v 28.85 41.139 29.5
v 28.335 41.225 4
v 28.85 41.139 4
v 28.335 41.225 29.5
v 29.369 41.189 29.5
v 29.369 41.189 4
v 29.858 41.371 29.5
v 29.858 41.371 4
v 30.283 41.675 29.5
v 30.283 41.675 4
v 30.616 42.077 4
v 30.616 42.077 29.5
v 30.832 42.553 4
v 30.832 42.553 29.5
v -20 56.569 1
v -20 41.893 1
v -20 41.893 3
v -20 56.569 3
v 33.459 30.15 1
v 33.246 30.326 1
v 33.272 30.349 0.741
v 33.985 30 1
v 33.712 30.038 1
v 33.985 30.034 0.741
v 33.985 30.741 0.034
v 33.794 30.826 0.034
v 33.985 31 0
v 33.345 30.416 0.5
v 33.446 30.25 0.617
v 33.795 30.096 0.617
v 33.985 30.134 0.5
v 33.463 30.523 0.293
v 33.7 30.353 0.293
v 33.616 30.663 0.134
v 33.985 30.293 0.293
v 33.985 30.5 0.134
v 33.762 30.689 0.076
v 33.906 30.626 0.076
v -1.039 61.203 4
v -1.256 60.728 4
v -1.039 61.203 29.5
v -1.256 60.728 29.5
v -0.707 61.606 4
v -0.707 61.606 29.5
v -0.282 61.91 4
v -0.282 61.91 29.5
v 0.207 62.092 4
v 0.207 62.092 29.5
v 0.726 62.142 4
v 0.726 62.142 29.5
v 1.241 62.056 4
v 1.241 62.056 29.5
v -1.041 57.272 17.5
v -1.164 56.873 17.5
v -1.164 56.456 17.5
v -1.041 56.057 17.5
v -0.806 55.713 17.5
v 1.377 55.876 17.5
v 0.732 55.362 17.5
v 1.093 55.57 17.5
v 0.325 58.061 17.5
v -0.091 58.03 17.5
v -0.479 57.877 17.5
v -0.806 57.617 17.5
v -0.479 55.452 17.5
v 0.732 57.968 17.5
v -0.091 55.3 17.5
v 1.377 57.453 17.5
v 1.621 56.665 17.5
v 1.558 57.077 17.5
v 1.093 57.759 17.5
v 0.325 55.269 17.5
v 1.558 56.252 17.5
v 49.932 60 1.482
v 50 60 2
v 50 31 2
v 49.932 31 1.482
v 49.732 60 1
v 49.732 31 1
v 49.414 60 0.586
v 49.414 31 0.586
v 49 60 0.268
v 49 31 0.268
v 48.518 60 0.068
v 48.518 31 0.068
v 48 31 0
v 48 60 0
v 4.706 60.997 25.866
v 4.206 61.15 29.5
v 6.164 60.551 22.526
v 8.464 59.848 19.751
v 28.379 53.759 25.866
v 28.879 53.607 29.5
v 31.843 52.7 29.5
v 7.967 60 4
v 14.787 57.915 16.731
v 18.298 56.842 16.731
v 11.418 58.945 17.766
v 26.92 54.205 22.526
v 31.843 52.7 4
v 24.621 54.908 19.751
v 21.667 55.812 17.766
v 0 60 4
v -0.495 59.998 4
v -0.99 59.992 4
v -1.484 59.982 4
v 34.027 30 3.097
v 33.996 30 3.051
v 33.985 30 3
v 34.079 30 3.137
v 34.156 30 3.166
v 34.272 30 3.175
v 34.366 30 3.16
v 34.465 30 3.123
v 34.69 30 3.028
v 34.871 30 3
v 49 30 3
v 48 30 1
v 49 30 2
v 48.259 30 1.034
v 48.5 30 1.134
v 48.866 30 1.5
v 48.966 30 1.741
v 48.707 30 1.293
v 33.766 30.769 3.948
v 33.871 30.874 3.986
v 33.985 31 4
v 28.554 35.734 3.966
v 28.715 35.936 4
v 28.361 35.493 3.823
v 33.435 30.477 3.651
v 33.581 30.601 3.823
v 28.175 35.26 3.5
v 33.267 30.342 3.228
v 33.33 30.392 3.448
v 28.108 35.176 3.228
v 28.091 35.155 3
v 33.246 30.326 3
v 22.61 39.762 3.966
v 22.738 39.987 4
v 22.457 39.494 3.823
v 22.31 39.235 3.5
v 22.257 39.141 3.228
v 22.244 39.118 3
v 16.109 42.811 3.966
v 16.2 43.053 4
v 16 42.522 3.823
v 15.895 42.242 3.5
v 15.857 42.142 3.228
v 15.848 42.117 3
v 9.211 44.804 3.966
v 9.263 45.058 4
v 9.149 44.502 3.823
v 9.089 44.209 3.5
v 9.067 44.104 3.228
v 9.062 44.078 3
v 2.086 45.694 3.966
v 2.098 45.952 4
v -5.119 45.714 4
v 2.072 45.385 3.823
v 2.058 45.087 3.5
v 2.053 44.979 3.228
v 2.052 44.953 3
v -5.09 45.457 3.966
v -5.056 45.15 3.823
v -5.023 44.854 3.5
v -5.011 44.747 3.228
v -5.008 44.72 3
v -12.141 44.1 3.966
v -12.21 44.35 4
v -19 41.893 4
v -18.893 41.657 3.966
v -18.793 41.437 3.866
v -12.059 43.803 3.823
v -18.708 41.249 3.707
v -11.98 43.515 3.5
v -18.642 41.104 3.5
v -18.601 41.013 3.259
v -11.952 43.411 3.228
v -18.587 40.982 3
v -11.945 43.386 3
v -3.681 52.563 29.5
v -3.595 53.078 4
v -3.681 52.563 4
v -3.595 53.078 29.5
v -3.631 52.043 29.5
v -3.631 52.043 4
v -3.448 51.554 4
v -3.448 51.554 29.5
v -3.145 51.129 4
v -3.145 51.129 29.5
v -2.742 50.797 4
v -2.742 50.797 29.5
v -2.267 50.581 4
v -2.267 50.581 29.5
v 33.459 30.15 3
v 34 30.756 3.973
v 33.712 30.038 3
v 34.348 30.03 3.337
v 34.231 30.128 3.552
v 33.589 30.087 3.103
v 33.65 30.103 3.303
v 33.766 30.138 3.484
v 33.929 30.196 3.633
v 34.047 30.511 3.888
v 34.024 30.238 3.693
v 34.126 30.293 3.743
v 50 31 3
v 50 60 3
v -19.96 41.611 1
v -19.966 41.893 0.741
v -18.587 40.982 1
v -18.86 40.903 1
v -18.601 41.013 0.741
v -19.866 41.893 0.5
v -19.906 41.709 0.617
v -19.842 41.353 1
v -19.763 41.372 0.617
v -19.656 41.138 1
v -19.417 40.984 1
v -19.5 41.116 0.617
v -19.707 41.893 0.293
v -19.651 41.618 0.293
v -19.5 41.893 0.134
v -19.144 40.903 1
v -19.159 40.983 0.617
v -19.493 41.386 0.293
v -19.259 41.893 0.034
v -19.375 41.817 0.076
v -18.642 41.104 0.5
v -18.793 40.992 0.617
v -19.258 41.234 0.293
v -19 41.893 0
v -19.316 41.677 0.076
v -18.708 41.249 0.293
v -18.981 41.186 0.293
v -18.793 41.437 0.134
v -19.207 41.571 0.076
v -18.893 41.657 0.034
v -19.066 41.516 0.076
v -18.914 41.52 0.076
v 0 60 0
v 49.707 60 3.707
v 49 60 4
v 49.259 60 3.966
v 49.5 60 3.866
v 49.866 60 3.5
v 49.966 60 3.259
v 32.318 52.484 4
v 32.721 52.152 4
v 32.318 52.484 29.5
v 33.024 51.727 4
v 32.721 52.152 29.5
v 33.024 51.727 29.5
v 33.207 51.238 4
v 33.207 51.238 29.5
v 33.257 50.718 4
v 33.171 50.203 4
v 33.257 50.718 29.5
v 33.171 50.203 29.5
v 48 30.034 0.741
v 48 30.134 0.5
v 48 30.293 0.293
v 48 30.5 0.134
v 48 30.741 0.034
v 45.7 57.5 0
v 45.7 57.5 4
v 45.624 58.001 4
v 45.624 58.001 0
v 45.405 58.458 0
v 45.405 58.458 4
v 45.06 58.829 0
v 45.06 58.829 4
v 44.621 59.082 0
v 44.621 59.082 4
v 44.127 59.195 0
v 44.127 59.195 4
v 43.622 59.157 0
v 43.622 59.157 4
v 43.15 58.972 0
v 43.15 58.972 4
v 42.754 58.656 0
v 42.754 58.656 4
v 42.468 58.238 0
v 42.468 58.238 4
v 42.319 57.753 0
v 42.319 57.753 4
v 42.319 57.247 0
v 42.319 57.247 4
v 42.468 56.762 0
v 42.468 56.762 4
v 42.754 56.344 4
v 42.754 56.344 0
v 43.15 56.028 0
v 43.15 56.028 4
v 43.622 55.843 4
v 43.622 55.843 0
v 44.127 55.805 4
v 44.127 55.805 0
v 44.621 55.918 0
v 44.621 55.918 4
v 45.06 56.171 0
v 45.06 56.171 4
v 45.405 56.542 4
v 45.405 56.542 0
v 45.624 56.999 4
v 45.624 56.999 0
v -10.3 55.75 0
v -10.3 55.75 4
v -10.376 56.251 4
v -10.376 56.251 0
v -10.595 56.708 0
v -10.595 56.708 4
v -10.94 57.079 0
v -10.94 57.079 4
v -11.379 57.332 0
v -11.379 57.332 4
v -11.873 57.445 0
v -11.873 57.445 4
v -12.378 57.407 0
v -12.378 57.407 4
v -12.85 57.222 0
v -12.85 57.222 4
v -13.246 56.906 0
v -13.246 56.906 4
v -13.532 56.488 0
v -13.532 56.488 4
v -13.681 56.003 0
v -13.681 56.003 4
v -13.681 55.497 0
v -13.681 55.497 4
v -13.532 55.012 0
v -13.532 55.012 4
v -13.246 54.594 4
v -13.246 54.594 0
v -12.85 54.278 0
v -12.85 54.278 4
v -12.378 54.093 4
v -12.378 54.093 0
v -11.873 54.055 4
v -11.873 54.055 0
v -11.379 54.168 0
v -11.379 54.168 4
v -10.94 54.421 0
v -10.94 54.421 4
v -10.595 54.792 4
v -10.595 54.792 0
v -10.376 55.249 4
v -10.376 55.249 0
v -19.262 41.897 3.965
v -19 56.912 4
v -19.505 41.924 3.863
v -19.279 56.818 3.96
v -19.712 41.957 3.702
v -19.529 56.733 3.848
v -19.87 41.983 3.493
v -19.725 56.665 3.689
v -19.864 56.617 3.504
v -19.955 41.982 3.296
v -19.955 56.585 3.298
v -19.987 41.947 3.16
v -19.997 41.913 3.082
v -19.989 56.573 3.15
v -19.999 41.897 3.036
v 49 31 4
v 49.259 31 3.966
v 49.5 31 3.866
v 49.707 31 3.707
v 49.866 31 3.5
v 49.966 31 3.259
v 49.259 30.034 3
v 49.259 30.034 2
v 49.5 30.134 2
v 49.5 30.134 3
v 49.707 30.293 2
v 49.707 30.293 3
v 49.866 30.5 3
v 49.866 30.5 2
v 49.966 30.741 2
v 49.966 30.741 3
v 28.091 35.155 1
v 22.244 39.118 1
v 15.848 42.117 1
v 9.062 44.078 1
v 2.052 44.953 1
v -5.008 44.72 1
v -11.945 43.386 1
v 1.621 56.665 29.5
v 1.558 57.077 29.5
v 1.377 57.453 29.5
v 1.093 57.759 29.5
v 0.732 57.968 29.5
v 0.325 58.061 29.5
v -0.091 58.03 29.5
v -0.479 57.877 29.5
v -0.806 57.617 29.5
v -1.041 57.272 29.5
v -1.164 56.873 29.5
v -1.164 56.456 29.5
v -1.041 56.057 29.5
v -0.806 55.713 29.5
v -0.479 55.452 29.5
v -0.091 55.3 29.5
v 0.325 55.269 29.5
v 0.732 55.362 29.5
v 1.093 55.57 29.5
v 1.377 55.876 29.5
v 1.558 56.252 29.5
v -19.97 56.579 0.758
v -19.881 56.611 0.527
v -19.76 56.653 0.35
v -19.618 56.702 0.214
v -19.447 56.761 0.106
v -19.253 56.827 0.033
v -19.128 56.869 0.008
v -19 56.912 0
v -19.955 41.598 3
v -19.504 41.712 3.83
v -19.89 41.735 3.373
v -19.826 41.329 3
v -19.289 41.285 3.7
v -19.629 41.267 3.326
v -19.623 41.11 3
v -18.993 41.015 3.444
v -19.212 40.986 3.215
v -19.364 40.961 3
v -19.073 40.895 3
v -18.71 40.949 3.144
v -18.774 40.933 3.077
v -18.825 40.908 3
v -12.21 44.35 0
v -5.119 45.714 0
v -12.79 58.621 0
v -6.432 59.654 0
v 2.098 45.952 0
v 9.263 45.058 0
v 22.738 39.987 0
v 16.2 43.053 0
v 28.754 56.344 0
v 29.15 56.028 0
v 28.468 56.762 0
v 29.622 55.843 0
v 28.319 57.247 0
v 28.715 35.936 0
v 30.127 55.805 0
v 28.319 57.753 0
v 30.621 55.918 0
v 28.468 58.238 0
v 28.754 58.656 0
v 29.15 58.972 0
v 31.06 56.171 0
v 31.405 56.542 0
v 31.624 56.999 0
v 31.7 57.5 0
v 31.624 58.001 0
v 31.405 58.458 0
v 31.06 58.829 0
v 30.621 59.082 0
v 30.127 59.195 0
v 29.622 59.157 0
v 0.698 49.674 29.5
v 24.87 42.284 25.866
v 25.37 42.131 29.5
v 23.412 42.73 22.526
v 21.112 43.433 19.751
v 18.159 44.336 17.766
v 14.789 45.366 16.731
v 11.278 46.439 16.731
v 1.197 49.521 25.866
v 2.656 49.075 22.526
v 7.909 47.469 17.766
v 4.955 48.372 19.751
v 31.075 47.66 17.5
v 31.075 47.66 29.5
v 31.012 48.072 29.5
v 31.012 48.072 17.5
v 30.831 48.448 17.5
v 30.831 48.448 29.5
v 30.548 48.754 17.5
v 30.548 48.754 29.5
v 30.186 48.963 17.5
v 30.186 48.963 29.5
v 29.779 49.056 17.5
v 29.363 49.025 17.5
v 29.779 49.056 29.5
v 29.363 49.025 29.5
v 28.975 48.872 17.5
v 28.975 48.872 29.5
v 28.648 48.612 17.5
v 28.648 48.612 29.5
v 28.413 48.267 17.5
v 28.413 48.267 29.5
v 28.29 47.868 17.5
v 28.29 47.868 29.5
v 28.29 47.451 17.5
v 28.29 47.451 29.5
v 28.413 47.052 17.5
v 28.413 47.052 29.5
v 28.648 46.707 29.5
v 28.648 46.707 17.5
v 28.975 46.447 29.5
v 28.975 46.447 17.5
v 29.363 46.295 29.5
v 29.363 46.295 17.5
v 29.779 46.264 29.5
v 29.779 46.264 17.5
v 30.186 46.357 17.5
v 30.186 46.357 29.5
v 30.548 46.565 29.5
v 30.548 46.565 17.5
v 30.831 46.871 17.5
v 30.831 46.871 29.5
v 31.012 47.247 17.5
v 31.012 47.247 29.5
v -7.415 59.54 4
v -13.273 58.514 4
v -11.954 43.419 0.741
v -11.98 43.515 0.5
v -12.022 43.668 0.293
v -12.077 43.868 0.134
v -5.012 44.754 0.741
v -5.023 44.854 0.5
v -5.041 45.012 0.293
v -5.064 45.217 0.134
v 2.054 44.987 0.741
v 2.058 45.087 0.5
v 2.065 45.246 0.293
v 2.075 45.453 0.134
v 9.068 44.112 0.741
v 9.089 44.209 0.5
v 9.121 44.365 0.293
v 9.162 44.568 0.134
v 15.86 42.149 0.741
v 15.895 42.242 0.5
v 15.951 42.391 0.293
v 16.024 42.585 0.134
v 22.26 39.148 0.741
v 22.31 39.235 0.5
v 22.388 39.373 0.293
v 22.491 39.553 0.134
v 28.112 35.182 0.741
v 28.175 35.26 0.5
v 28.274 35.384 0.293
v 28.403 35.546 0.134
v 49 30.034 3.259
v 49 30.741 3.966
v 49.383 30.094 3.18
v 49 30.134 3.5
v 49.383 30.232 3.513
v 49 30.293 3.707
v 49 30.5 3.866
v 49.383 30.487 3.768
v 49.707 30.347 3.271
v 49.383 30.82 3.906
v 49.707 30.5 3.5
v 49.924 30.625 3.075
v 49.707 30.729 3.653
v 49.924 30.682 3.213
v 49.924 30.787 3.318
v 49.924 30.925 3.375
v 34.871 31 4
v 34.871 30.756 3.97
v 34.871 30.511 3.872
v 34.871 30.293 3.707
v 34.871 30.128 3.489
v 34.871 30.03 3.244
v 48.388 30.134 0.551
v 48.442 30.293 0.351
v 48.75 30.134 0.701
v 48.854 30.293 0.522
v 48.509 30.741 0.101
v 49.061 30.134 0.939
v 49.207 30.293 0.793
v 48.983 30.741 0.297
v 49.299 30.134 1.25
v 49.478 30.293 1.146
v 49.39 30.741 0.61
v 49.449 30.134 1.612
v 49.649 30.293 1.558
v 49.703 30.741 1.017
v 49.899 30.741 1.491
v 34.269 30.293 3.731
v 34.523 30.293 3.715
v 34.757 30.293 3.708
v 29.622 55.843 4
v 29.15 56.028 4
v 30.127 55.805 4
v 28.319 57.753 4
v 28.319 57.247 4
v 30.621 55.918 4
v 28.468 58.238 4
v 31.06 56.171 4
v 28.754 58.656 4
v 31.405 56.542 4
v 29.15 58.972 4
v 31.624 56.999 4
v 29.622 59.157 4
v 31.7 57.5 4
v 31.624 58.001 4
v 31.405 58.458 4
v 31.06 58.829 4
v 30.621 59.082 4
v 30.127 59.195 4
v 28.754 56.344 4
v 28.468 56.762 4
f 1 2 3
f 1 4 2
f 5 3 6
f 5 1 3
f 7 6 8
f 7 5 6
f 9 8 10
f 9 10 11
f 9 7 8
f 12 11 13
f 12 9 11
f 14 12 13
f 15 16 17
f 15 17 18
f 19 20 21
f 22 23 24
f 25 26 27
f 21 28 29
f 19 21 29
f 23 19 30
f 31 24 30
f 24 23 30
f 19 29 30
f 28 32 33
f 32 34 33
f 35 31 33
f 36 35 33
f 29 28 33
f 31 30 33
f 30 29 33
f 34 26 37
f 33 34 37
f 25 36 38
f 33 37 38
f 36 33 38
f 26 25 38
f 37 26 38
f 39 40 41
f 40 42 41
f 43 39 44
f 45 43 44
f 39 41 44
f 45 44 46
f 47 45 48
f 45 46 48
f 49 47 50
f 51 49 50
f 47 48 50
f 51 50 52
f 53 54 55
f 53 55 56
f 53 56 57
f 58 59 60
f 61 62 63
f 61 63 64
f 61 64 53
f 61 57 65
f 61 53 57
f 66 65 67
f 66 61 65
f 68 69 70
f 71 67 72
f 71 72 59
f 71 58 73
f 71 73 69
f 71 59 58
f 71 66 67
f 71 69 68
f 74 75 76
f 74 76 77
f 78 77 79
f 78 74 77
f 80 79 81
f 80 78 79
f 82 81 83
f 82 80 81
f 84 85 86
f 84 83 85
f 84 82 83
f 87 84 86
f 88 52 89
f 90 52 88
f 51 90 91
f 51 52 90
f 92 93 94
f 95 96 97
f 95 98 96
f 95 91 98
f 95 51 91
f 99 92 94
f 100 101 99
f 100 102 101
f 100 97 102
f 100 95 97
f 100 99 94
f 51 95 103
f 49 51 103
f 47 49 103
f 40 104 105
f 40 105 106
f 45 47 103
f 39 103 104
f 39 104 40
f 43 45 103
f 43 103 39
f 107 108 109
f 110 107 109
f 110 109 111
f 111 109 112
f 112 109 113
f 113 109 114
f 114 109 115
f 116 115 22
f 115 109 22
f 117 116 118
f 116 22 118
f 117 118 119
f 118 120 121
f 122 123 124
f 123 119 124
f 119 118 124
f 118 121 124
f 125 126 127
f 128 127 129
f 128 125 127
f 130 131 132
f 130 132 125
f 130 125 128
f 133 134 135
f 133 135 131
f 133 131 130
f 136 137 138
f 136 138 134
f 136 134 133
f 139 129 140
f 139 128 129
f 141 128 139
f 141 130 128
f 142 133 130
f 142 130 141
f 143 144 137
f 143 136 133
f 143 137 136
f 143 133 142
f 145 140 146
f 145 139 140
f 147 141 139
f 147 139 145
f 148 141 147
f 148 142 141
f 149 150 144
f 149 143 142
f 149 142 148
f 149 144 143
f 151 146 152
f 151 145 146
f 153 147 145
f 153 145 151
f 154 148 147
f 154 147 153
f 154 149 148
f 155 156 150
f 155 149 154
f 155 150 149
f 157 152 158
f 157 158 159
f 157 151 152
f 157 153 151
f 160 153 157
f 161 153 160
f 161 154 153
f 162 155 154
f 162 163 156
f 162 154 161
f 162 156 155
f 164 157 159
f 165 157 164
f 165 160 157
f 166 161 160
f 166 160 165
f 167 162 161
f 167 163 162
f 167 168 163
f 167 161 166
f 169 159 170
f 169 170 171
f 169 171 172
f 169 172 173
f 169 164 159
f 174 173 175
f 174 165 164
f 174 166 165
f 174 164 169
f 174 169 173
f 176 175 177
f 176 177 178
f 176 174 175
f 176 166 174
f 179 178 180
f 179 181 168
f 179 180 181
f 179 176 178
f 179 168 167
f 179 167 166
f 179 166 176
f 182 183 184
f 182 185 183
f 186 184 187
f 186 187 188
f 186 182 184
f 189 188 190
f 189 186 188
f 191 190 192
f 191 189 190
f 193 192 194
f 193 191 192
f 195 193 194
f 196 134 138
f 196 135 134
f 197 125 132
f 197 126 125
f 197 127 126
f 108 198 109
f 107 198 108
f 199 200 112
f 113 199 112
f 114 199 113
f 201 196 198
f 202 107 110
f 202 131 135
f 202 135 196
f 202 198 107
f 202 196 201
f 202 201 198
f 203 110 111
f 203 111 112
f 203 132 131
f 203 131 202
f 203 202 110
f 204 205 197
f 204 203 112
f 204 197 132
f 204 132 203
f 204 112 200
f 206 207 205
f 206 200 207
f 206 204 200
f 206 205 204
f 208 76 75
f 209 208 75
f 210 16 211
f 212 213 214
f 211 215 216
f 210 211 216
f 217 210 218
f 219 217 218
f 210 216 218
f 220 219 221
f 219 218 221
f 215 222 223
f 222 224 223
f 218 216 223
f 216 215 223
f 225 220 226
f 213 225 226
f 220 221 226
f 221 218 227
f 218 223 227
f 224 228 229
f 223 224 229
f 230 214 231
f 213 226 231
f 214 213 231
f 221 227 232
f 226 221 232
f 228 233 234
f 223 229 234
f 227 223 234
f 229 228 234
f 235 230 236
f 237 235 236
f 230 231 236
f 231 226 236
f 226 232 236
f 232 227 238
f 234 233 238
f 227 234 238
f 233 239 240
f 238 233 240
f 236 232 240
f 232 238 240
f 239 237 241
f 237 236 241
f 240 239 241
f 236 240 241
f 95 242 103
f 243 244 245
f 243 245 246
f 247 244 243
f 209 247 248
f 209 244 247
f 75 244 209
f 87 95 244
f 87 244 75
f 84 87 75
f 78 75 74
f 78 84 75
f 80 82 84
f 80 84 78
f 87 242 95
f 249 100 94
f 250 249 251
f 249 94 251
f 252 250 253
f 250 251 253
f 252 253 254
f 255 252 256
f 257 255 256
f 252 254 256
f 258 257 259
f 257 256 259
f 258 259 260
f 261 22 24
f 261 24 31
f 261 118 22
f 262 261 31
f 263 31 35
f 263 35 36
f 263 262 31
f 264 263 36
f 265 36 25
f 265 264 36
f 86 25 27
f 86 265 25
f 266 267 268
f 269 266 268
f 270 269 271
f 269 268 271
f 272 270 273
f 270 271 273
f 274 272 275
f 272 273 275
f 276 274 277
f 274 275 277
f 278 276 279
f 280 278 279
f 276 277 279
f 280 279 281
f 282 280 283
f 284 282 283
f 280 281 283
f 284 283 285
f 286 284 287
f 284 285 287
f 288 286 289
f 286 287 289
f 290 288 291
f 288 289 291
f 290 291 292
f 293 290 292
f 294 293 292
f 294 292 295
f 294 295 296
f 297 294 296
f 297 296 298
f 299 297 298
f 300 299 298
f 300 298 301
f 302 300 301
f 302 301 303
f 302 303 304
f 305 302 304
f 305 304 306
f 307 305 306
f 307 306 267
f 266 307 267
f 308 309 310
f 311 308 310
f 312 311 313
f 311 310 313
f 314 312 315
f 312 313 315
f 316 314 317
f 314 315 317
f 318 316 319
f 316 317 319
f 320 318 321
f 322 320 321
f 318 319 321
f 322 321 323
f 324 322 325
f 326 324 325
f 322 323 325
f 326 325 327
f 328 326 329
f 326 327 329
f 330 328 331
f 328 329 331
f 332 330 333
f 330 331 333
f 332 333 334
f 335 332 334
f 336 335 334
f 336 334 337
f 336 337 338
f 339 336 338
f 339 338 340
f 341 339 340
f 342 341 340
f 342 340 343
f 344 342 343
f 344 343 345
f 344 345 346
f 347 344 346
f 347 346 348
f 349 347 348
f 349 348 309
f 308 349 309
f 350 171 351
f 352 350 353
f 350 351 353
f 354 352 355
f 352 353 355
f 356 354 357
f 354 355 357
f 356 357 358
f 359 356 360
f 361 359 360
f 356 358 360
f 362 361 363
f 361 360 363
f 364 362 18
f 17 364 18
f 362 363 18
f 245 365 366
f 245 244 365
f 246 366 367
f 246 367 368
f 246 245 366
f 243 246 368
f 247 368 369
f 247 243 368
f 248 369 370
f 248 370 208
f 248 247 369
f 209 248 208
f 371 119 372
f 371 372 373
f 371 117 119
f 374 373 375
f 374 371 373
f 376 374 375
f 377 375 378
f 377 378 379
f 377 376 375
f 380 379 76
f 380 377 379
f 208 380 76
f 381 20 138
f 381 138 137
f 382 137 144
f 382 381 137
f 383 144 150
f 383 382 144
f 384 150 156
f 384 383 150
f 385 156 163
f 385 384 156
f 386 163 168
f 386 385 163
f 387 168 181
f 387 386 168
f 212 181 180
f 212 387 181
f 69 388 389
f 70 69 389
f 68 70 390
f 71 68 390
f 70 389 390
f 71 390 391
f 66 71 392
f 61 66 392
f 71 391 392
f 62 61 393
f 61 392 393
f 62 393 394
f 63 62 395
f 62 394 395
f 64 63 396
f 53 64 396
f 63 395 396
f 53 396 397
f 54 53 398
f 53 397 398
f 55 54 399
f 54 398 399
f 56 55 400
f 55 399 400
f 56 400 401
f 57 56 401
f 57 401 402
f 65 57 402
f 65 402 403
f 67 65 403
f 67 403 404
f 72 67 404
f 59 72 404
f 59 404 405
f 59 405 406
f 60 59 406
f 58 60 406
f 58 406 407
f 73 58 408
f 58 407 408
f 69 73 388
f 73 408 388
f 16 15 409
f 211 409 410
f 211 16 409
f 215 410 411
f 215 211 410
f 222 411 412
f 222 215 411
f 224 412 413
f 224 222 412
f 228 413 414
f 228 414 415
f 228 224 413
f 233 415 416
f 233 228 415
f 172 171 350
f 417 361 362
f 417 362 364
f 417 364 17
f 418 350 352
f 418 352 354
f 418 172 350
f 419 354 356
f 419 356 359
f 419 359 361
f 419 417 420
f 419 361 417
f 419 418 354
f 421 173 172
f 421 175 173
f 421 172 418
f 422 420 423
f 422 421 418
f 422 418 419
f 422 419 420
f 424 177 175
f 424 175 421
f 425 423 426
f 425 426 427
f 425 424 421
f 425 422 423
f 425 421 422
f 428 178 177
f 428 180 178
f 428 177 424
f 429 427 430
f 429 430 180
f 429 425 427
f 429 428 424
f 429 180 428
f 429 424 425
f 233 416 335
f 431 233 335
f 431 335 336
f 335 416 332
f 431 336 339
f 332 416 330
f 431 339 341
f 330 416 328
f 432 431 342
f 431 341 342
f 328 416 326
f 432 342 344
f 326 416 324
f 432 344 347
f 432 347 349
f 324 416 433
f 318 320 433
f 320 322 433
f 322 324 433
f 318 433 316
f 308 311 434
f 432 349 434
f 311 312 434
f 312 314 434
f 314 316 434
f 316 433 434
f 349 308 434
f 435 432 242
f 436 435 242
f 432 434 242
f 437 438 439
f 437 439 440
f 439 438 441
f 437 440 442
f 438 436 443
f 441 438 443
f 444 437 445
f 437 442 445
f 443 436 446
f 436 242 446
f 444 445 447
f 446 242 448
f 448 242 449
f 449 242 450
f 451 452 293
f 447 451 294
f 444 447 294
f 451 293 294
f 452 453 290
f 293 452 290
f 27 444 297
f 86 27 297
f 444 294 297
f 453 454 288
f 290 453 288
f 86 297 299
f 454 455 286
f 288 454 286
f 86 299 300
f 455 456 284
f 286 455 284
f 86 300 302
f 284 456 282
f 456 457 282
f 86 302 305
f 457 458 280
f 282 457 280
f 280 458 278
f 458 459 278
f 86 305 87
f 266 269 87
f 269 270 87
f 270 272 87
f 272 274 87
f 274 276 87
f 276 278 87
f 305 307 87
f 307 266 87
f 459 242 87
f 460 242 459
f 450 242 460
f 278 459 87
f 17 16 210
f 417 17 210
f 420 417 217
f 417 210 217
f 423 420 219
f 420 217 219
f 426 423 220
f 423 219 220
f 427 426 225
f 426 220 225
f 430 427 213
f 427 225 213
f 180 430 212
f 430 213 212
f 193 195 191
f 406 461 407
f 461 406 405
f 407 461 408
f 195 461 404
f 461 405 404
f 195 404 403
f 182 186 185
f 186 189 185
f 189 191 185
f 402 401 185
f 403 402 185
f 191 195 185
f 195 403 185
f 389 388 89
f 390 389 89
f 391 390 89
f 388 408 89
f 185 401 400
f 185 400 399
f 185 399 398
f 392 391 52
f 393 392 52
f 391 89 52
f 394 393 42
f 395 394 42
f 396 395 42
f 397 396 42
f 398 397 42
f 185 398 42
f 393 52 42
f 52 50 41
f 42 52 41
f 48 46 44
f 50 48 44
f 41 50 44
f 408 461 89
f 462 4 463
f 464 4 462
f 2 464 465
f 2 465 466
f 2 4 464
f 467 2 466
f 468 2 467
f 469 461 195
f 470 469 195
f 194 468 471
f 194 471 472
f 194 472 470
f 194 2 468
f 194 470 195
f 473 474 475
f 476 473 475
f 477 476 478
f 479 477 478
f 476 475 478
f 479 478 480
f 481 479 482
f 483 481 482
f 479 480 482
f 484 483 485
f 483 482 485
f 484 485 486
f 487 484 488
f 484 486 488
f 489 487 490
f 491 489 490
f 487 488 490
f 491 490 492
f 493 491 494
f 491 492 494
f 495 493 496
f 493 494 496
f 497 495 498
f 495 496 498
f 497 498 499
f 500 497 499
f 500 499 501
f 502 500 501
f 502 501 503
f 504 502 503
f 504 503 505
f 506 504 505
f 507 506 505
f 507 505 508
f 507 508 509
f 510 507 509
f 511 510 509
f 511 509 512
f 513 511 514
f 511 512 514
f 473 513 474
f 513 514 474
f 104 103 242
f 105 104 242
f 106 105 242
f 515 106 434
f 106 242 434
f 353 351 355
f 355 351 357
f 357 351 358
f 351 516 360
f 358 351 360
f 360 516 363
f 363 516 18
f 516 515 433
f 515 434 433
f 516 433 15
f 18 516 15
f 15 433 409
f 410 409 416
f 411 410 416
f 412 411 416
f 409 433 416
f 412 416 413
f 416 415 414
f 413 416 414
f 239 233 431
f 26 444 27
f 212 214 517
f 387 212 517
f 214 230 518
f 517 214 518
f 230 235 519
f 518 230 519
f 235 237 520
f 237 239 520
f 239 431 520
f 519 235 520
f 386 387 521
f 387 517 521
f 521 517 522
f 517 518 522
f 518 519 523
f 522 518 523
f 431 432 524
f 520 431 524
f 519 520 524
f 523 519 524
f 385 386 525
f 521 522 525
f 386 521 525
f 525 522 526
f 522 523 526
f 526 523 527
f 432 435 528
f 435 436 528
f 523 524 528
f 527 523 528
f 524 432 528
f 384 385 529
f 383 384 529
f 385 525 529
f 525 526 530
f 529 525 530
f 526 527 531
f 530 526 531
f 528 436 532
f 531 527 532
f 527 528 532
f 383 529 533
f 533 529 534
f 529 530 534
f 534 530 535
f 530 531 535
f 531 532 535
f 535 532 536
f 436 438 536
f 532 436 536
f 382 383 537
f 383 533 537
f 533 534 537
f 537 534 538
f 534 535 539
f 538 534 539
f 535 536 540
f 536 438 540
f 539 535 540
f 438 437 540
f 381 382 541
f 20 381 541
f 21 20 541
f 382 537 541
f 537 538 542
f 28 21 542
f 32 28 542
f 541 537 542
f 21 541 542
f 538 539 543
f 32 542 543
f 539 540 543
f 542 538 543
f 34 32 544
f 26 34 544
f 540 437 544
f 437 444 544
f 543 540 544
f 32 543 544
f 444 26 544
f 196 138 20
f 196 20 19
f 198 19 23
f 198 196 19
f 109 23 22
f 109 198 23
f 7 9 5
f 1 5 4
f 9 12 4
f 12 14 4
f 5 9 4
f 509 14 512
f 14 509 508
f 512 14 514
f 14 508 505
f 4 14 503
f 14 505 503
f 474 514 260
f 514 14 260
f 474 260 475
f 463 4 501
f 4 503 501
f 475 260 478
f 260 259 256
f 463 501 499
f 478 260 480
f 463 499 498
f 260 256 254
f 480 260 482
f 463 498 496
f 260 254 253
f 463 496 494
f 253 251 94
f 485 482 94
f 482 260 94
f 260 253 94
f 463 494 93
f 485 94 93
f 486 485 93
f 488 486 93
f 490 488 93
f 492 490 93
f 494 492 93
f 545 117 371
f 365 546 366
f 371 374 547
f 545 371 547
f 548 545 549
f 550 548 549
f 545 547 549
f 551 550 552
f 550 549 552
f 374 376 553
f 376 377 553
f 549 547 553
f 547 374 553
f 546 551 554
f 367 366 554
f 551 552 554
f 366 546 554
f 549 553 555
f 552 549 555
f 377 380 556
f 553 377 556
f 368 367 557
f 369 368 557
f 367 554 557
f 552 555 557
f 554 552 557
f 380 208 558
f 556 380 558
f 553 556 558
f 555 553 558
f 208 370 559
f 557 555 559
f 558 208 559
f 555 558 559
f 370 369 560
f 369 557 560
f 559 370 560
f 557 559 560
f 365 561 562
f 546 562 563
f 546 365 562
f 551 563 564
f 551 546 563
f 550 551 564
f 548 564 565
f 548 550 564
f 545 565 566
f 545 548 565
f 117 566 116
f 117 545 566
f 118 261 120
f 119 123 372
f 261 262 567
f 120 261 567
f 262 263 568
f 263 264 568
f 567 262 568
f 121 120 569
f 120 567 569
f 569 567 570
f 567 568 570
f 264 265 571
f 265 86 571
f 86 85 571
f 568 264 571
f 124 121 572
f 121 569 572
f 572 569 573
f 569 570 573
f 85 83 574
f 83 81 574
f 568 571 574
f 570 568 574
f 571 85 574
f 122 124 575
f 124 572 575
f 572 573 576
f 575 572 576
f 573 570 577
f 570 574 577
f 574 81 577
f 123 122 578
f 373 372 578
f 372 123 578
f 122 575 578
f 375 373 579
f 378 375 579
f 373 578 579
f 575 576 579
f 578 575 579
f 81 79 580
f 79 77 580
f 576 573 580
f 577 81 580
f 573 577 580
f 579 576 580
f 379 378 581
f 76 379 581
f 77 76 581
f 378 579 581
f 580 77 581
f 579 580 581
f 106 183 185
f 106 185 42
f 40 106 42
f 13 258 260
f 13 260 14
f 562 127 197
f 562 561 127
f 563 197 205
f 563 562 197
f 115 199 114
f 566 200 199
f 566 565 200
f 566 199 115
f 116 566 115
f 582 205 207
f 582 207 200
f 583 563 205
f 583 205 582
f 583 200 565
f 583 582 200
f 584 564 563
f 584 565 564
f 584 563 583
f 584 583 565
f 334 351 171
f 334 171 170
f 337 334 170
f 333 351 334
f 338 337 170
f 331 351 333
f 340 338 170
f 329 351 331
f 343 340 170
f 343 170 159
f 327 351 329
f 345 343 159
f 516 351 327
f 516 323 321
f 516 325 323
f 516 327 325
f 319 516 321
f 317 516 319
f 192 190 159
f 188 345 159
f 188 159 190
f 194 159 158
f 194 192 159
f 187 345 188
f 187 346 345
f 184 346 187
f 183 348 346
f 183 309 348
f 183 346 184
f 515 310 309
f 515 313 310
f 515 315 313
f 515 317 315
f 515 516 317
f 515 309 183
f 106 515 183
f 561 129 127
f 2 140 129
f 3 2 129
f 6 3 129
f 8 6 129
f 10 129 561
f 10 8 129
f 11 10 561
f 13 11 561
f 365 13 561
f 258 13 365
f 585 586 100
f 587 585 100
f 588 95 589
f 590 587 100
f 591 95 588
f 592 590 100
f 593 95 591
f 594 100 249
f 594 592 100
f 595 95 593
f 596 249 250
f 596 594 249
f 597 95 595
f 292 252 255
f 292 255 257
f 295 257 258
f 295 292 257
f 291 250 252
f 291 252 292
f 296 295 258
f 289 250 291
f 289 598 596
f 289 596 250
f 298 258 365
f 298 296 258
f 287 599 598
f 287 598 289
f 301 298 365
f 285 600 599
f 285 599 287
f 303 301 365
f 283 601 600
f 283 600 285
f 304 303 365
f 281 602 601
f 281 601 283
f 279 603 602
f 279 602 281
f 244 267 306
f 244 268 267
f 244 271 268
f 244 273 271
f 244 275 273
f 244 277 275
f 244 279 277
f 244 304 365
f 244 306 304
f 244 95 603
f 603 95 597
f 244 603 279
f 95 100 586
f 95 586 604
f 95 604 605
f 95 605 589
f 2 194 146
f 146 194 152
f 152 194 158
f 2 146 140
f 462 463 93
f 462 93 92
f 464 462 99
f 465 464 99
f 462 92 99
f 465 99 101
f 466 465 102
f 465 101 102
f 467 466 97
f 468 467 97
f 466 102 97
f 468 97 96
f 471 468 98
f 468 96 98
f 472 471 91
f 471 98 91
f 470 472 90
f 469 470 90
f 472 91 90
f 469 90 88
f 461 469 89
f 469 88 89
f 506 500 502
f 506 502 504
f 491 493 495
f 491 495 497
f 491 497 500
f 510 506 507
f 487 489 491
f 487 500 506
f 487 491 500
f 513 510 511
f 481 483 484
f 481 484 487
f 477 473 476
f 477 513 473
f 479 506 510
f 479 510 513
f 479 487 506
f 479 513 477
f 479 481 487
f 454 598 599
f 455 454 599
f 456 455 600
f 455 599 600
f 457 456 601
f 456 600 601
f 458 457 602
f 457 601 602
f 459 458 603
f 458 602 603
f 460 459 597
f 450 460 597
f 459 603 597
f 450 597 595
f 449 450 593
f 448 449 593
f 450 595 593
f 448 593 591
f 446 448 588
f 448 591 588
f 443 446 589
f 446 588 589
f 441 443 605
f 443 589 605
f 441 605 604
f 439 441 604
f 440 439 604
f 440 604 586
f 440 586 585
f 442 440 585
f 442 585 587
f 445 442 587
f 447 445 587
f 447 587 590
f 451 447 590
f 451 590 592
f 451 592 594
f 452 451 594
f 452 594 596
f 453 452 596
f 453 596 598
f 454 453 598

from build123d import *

# Parameters (mm, degrees)
PAD_DEPTH       = 4
PAD001_DEPTH    = 25.5
SKETCH002_R     = 12.9
POCKET_DEPTH    = 36.8669197108
FILLET_R        = 2
FILLET001_R     = 1
FILLET002_R     = 1
FILLET003_R     = 1
SKETCH003_R     = 1.4
POCKET001_DEPTH = 12
SKETCH004_R     = 1.7
POCKET002_DEPTH = 4.0010001
FILLET004_R     = 2
FILLET005_R     = 1


with BuildPart() as part:
    # Sketch → Pad (new body)
    with BuildSketch(Plane.XY):
        with BuildLine():
            Line((33.5410196625, 30), (50, 30))
            Line((50, 30), (50, 60))
            Line((0, 60), (50, 60))
            ThreePointArc((0, 60), (-10.1461187235, 59.1359135792), (-20, 56.5685424949))
            Line((-20, 40.3112887415), (-20, 56.5685424949))
            ThreePointArc((33.5410196625, 30), (8.5100218715, 44.1880020792), (-20, 40.3112887415))
        make_face()
    extrude(amount=PAD_DEPTH)

    # Sketch001 → Pad001 (new body)
    with BuildSketch(Plane.XY.offset(4)):
        Polygon((-0.671183324, 62.6409760428), (33.7557878907, 52.1155946728), (30.247327434, 40.6399376012), (-4.1796437807, 51.1653189712), align=None)
    extrude(amount=PAD001_DEPTH)

    # Sketch002 → Pocket (cut, through all)
    with BuildSketch(Plane(origin=(17.4568210696, 57.098688906, 0), x_dir=(-0.956304756, 0.2923717047, 0), z_dir=(0.2923717047, 0.956304756, 0))):
        with Locations((0.956304756, 29.5)):
            Circle(SKETCH002_R)
    extrude(amount=-POCKET_DEPTH, mode=Mode.SUBTRACT)

    # Fillet
    fillet_edges = [part.edges().sort_by_distance(p)[0] for p in [
        (50, 45, 0),
    ]]
    fillet(fillet_edges, radius=FILLET_R)

    # Fillet001
    fillet001_edges = [part.edges().sort_by_distance(p)[0] for p in [
        (-20, 48.439916, 4),
    ]]
    fillet(fillet001_edges, radius=FILLET001_R)

    # Fillet002
    fillet002_edges = [part.edges().sort_by_distance(p)[0] for p in [
        (9.054169, 44.079724, 4),
    ]]
    fillet(fillet002_edges, radius=FILLET002_R)

    # Fillet003
    fillet003_edges = [part.edges().sort_by_distance(p)[0] for p in [
        (42.435596, 30, 4),
    ]]
    fillet(fillet003_edges, radius=FILLET003_R)

    # Sketch003 → Pocket001 (cut)
    with BuildSketch(Plane.XY.offset(29.5)):
        with Locations((0.2205096629, 56.6647829722)):
            Circle(SKETCH003_R)
        with Locations((29.6746961465, 47.6597344667)):
            Circle(SKETCH003_R)
    extrude(amount=-POCKET001_DEPTH, mode=Mode.SUBTRACT)

    # Sketch004 → Pocket002 (cut, through all)
    with BuildSketch(Plane.XY.offset(4)):
        with Locations((44, 57.5)):
            Circle(SKETCH004_R)
        with Locations((-12, 55.75)):
            Circle(SKETCH004_R)
        with Locations((30, 57.5)):
            Circle(SKETCH004_R)
    extrude(amount=-POCKET002_DEPTH, mode=Mode.SUBTRACT)

    # Fillet004
    fillet004_edges = [part.edges().sort_by_distance(p)[0] for p in [
        (-0.671183, 62.640976, 16.75),
        (33.755788, 52.115595, 16.75),
        (30.247327, 40.639938, 16.75),
        (-4.179644, 51.165319, 16.75),
    ]]
    fillet(fillet004_edges, radius=FILLET004_R)

    # Fillet005
    fillet005_edges = [part.edges().sort_by_distance(p)[0] for p in [
        (50, 45.5, 4),
    ]]
    fillet(fillet005_edges, radius=FILLET005_R)


solid = part.part
